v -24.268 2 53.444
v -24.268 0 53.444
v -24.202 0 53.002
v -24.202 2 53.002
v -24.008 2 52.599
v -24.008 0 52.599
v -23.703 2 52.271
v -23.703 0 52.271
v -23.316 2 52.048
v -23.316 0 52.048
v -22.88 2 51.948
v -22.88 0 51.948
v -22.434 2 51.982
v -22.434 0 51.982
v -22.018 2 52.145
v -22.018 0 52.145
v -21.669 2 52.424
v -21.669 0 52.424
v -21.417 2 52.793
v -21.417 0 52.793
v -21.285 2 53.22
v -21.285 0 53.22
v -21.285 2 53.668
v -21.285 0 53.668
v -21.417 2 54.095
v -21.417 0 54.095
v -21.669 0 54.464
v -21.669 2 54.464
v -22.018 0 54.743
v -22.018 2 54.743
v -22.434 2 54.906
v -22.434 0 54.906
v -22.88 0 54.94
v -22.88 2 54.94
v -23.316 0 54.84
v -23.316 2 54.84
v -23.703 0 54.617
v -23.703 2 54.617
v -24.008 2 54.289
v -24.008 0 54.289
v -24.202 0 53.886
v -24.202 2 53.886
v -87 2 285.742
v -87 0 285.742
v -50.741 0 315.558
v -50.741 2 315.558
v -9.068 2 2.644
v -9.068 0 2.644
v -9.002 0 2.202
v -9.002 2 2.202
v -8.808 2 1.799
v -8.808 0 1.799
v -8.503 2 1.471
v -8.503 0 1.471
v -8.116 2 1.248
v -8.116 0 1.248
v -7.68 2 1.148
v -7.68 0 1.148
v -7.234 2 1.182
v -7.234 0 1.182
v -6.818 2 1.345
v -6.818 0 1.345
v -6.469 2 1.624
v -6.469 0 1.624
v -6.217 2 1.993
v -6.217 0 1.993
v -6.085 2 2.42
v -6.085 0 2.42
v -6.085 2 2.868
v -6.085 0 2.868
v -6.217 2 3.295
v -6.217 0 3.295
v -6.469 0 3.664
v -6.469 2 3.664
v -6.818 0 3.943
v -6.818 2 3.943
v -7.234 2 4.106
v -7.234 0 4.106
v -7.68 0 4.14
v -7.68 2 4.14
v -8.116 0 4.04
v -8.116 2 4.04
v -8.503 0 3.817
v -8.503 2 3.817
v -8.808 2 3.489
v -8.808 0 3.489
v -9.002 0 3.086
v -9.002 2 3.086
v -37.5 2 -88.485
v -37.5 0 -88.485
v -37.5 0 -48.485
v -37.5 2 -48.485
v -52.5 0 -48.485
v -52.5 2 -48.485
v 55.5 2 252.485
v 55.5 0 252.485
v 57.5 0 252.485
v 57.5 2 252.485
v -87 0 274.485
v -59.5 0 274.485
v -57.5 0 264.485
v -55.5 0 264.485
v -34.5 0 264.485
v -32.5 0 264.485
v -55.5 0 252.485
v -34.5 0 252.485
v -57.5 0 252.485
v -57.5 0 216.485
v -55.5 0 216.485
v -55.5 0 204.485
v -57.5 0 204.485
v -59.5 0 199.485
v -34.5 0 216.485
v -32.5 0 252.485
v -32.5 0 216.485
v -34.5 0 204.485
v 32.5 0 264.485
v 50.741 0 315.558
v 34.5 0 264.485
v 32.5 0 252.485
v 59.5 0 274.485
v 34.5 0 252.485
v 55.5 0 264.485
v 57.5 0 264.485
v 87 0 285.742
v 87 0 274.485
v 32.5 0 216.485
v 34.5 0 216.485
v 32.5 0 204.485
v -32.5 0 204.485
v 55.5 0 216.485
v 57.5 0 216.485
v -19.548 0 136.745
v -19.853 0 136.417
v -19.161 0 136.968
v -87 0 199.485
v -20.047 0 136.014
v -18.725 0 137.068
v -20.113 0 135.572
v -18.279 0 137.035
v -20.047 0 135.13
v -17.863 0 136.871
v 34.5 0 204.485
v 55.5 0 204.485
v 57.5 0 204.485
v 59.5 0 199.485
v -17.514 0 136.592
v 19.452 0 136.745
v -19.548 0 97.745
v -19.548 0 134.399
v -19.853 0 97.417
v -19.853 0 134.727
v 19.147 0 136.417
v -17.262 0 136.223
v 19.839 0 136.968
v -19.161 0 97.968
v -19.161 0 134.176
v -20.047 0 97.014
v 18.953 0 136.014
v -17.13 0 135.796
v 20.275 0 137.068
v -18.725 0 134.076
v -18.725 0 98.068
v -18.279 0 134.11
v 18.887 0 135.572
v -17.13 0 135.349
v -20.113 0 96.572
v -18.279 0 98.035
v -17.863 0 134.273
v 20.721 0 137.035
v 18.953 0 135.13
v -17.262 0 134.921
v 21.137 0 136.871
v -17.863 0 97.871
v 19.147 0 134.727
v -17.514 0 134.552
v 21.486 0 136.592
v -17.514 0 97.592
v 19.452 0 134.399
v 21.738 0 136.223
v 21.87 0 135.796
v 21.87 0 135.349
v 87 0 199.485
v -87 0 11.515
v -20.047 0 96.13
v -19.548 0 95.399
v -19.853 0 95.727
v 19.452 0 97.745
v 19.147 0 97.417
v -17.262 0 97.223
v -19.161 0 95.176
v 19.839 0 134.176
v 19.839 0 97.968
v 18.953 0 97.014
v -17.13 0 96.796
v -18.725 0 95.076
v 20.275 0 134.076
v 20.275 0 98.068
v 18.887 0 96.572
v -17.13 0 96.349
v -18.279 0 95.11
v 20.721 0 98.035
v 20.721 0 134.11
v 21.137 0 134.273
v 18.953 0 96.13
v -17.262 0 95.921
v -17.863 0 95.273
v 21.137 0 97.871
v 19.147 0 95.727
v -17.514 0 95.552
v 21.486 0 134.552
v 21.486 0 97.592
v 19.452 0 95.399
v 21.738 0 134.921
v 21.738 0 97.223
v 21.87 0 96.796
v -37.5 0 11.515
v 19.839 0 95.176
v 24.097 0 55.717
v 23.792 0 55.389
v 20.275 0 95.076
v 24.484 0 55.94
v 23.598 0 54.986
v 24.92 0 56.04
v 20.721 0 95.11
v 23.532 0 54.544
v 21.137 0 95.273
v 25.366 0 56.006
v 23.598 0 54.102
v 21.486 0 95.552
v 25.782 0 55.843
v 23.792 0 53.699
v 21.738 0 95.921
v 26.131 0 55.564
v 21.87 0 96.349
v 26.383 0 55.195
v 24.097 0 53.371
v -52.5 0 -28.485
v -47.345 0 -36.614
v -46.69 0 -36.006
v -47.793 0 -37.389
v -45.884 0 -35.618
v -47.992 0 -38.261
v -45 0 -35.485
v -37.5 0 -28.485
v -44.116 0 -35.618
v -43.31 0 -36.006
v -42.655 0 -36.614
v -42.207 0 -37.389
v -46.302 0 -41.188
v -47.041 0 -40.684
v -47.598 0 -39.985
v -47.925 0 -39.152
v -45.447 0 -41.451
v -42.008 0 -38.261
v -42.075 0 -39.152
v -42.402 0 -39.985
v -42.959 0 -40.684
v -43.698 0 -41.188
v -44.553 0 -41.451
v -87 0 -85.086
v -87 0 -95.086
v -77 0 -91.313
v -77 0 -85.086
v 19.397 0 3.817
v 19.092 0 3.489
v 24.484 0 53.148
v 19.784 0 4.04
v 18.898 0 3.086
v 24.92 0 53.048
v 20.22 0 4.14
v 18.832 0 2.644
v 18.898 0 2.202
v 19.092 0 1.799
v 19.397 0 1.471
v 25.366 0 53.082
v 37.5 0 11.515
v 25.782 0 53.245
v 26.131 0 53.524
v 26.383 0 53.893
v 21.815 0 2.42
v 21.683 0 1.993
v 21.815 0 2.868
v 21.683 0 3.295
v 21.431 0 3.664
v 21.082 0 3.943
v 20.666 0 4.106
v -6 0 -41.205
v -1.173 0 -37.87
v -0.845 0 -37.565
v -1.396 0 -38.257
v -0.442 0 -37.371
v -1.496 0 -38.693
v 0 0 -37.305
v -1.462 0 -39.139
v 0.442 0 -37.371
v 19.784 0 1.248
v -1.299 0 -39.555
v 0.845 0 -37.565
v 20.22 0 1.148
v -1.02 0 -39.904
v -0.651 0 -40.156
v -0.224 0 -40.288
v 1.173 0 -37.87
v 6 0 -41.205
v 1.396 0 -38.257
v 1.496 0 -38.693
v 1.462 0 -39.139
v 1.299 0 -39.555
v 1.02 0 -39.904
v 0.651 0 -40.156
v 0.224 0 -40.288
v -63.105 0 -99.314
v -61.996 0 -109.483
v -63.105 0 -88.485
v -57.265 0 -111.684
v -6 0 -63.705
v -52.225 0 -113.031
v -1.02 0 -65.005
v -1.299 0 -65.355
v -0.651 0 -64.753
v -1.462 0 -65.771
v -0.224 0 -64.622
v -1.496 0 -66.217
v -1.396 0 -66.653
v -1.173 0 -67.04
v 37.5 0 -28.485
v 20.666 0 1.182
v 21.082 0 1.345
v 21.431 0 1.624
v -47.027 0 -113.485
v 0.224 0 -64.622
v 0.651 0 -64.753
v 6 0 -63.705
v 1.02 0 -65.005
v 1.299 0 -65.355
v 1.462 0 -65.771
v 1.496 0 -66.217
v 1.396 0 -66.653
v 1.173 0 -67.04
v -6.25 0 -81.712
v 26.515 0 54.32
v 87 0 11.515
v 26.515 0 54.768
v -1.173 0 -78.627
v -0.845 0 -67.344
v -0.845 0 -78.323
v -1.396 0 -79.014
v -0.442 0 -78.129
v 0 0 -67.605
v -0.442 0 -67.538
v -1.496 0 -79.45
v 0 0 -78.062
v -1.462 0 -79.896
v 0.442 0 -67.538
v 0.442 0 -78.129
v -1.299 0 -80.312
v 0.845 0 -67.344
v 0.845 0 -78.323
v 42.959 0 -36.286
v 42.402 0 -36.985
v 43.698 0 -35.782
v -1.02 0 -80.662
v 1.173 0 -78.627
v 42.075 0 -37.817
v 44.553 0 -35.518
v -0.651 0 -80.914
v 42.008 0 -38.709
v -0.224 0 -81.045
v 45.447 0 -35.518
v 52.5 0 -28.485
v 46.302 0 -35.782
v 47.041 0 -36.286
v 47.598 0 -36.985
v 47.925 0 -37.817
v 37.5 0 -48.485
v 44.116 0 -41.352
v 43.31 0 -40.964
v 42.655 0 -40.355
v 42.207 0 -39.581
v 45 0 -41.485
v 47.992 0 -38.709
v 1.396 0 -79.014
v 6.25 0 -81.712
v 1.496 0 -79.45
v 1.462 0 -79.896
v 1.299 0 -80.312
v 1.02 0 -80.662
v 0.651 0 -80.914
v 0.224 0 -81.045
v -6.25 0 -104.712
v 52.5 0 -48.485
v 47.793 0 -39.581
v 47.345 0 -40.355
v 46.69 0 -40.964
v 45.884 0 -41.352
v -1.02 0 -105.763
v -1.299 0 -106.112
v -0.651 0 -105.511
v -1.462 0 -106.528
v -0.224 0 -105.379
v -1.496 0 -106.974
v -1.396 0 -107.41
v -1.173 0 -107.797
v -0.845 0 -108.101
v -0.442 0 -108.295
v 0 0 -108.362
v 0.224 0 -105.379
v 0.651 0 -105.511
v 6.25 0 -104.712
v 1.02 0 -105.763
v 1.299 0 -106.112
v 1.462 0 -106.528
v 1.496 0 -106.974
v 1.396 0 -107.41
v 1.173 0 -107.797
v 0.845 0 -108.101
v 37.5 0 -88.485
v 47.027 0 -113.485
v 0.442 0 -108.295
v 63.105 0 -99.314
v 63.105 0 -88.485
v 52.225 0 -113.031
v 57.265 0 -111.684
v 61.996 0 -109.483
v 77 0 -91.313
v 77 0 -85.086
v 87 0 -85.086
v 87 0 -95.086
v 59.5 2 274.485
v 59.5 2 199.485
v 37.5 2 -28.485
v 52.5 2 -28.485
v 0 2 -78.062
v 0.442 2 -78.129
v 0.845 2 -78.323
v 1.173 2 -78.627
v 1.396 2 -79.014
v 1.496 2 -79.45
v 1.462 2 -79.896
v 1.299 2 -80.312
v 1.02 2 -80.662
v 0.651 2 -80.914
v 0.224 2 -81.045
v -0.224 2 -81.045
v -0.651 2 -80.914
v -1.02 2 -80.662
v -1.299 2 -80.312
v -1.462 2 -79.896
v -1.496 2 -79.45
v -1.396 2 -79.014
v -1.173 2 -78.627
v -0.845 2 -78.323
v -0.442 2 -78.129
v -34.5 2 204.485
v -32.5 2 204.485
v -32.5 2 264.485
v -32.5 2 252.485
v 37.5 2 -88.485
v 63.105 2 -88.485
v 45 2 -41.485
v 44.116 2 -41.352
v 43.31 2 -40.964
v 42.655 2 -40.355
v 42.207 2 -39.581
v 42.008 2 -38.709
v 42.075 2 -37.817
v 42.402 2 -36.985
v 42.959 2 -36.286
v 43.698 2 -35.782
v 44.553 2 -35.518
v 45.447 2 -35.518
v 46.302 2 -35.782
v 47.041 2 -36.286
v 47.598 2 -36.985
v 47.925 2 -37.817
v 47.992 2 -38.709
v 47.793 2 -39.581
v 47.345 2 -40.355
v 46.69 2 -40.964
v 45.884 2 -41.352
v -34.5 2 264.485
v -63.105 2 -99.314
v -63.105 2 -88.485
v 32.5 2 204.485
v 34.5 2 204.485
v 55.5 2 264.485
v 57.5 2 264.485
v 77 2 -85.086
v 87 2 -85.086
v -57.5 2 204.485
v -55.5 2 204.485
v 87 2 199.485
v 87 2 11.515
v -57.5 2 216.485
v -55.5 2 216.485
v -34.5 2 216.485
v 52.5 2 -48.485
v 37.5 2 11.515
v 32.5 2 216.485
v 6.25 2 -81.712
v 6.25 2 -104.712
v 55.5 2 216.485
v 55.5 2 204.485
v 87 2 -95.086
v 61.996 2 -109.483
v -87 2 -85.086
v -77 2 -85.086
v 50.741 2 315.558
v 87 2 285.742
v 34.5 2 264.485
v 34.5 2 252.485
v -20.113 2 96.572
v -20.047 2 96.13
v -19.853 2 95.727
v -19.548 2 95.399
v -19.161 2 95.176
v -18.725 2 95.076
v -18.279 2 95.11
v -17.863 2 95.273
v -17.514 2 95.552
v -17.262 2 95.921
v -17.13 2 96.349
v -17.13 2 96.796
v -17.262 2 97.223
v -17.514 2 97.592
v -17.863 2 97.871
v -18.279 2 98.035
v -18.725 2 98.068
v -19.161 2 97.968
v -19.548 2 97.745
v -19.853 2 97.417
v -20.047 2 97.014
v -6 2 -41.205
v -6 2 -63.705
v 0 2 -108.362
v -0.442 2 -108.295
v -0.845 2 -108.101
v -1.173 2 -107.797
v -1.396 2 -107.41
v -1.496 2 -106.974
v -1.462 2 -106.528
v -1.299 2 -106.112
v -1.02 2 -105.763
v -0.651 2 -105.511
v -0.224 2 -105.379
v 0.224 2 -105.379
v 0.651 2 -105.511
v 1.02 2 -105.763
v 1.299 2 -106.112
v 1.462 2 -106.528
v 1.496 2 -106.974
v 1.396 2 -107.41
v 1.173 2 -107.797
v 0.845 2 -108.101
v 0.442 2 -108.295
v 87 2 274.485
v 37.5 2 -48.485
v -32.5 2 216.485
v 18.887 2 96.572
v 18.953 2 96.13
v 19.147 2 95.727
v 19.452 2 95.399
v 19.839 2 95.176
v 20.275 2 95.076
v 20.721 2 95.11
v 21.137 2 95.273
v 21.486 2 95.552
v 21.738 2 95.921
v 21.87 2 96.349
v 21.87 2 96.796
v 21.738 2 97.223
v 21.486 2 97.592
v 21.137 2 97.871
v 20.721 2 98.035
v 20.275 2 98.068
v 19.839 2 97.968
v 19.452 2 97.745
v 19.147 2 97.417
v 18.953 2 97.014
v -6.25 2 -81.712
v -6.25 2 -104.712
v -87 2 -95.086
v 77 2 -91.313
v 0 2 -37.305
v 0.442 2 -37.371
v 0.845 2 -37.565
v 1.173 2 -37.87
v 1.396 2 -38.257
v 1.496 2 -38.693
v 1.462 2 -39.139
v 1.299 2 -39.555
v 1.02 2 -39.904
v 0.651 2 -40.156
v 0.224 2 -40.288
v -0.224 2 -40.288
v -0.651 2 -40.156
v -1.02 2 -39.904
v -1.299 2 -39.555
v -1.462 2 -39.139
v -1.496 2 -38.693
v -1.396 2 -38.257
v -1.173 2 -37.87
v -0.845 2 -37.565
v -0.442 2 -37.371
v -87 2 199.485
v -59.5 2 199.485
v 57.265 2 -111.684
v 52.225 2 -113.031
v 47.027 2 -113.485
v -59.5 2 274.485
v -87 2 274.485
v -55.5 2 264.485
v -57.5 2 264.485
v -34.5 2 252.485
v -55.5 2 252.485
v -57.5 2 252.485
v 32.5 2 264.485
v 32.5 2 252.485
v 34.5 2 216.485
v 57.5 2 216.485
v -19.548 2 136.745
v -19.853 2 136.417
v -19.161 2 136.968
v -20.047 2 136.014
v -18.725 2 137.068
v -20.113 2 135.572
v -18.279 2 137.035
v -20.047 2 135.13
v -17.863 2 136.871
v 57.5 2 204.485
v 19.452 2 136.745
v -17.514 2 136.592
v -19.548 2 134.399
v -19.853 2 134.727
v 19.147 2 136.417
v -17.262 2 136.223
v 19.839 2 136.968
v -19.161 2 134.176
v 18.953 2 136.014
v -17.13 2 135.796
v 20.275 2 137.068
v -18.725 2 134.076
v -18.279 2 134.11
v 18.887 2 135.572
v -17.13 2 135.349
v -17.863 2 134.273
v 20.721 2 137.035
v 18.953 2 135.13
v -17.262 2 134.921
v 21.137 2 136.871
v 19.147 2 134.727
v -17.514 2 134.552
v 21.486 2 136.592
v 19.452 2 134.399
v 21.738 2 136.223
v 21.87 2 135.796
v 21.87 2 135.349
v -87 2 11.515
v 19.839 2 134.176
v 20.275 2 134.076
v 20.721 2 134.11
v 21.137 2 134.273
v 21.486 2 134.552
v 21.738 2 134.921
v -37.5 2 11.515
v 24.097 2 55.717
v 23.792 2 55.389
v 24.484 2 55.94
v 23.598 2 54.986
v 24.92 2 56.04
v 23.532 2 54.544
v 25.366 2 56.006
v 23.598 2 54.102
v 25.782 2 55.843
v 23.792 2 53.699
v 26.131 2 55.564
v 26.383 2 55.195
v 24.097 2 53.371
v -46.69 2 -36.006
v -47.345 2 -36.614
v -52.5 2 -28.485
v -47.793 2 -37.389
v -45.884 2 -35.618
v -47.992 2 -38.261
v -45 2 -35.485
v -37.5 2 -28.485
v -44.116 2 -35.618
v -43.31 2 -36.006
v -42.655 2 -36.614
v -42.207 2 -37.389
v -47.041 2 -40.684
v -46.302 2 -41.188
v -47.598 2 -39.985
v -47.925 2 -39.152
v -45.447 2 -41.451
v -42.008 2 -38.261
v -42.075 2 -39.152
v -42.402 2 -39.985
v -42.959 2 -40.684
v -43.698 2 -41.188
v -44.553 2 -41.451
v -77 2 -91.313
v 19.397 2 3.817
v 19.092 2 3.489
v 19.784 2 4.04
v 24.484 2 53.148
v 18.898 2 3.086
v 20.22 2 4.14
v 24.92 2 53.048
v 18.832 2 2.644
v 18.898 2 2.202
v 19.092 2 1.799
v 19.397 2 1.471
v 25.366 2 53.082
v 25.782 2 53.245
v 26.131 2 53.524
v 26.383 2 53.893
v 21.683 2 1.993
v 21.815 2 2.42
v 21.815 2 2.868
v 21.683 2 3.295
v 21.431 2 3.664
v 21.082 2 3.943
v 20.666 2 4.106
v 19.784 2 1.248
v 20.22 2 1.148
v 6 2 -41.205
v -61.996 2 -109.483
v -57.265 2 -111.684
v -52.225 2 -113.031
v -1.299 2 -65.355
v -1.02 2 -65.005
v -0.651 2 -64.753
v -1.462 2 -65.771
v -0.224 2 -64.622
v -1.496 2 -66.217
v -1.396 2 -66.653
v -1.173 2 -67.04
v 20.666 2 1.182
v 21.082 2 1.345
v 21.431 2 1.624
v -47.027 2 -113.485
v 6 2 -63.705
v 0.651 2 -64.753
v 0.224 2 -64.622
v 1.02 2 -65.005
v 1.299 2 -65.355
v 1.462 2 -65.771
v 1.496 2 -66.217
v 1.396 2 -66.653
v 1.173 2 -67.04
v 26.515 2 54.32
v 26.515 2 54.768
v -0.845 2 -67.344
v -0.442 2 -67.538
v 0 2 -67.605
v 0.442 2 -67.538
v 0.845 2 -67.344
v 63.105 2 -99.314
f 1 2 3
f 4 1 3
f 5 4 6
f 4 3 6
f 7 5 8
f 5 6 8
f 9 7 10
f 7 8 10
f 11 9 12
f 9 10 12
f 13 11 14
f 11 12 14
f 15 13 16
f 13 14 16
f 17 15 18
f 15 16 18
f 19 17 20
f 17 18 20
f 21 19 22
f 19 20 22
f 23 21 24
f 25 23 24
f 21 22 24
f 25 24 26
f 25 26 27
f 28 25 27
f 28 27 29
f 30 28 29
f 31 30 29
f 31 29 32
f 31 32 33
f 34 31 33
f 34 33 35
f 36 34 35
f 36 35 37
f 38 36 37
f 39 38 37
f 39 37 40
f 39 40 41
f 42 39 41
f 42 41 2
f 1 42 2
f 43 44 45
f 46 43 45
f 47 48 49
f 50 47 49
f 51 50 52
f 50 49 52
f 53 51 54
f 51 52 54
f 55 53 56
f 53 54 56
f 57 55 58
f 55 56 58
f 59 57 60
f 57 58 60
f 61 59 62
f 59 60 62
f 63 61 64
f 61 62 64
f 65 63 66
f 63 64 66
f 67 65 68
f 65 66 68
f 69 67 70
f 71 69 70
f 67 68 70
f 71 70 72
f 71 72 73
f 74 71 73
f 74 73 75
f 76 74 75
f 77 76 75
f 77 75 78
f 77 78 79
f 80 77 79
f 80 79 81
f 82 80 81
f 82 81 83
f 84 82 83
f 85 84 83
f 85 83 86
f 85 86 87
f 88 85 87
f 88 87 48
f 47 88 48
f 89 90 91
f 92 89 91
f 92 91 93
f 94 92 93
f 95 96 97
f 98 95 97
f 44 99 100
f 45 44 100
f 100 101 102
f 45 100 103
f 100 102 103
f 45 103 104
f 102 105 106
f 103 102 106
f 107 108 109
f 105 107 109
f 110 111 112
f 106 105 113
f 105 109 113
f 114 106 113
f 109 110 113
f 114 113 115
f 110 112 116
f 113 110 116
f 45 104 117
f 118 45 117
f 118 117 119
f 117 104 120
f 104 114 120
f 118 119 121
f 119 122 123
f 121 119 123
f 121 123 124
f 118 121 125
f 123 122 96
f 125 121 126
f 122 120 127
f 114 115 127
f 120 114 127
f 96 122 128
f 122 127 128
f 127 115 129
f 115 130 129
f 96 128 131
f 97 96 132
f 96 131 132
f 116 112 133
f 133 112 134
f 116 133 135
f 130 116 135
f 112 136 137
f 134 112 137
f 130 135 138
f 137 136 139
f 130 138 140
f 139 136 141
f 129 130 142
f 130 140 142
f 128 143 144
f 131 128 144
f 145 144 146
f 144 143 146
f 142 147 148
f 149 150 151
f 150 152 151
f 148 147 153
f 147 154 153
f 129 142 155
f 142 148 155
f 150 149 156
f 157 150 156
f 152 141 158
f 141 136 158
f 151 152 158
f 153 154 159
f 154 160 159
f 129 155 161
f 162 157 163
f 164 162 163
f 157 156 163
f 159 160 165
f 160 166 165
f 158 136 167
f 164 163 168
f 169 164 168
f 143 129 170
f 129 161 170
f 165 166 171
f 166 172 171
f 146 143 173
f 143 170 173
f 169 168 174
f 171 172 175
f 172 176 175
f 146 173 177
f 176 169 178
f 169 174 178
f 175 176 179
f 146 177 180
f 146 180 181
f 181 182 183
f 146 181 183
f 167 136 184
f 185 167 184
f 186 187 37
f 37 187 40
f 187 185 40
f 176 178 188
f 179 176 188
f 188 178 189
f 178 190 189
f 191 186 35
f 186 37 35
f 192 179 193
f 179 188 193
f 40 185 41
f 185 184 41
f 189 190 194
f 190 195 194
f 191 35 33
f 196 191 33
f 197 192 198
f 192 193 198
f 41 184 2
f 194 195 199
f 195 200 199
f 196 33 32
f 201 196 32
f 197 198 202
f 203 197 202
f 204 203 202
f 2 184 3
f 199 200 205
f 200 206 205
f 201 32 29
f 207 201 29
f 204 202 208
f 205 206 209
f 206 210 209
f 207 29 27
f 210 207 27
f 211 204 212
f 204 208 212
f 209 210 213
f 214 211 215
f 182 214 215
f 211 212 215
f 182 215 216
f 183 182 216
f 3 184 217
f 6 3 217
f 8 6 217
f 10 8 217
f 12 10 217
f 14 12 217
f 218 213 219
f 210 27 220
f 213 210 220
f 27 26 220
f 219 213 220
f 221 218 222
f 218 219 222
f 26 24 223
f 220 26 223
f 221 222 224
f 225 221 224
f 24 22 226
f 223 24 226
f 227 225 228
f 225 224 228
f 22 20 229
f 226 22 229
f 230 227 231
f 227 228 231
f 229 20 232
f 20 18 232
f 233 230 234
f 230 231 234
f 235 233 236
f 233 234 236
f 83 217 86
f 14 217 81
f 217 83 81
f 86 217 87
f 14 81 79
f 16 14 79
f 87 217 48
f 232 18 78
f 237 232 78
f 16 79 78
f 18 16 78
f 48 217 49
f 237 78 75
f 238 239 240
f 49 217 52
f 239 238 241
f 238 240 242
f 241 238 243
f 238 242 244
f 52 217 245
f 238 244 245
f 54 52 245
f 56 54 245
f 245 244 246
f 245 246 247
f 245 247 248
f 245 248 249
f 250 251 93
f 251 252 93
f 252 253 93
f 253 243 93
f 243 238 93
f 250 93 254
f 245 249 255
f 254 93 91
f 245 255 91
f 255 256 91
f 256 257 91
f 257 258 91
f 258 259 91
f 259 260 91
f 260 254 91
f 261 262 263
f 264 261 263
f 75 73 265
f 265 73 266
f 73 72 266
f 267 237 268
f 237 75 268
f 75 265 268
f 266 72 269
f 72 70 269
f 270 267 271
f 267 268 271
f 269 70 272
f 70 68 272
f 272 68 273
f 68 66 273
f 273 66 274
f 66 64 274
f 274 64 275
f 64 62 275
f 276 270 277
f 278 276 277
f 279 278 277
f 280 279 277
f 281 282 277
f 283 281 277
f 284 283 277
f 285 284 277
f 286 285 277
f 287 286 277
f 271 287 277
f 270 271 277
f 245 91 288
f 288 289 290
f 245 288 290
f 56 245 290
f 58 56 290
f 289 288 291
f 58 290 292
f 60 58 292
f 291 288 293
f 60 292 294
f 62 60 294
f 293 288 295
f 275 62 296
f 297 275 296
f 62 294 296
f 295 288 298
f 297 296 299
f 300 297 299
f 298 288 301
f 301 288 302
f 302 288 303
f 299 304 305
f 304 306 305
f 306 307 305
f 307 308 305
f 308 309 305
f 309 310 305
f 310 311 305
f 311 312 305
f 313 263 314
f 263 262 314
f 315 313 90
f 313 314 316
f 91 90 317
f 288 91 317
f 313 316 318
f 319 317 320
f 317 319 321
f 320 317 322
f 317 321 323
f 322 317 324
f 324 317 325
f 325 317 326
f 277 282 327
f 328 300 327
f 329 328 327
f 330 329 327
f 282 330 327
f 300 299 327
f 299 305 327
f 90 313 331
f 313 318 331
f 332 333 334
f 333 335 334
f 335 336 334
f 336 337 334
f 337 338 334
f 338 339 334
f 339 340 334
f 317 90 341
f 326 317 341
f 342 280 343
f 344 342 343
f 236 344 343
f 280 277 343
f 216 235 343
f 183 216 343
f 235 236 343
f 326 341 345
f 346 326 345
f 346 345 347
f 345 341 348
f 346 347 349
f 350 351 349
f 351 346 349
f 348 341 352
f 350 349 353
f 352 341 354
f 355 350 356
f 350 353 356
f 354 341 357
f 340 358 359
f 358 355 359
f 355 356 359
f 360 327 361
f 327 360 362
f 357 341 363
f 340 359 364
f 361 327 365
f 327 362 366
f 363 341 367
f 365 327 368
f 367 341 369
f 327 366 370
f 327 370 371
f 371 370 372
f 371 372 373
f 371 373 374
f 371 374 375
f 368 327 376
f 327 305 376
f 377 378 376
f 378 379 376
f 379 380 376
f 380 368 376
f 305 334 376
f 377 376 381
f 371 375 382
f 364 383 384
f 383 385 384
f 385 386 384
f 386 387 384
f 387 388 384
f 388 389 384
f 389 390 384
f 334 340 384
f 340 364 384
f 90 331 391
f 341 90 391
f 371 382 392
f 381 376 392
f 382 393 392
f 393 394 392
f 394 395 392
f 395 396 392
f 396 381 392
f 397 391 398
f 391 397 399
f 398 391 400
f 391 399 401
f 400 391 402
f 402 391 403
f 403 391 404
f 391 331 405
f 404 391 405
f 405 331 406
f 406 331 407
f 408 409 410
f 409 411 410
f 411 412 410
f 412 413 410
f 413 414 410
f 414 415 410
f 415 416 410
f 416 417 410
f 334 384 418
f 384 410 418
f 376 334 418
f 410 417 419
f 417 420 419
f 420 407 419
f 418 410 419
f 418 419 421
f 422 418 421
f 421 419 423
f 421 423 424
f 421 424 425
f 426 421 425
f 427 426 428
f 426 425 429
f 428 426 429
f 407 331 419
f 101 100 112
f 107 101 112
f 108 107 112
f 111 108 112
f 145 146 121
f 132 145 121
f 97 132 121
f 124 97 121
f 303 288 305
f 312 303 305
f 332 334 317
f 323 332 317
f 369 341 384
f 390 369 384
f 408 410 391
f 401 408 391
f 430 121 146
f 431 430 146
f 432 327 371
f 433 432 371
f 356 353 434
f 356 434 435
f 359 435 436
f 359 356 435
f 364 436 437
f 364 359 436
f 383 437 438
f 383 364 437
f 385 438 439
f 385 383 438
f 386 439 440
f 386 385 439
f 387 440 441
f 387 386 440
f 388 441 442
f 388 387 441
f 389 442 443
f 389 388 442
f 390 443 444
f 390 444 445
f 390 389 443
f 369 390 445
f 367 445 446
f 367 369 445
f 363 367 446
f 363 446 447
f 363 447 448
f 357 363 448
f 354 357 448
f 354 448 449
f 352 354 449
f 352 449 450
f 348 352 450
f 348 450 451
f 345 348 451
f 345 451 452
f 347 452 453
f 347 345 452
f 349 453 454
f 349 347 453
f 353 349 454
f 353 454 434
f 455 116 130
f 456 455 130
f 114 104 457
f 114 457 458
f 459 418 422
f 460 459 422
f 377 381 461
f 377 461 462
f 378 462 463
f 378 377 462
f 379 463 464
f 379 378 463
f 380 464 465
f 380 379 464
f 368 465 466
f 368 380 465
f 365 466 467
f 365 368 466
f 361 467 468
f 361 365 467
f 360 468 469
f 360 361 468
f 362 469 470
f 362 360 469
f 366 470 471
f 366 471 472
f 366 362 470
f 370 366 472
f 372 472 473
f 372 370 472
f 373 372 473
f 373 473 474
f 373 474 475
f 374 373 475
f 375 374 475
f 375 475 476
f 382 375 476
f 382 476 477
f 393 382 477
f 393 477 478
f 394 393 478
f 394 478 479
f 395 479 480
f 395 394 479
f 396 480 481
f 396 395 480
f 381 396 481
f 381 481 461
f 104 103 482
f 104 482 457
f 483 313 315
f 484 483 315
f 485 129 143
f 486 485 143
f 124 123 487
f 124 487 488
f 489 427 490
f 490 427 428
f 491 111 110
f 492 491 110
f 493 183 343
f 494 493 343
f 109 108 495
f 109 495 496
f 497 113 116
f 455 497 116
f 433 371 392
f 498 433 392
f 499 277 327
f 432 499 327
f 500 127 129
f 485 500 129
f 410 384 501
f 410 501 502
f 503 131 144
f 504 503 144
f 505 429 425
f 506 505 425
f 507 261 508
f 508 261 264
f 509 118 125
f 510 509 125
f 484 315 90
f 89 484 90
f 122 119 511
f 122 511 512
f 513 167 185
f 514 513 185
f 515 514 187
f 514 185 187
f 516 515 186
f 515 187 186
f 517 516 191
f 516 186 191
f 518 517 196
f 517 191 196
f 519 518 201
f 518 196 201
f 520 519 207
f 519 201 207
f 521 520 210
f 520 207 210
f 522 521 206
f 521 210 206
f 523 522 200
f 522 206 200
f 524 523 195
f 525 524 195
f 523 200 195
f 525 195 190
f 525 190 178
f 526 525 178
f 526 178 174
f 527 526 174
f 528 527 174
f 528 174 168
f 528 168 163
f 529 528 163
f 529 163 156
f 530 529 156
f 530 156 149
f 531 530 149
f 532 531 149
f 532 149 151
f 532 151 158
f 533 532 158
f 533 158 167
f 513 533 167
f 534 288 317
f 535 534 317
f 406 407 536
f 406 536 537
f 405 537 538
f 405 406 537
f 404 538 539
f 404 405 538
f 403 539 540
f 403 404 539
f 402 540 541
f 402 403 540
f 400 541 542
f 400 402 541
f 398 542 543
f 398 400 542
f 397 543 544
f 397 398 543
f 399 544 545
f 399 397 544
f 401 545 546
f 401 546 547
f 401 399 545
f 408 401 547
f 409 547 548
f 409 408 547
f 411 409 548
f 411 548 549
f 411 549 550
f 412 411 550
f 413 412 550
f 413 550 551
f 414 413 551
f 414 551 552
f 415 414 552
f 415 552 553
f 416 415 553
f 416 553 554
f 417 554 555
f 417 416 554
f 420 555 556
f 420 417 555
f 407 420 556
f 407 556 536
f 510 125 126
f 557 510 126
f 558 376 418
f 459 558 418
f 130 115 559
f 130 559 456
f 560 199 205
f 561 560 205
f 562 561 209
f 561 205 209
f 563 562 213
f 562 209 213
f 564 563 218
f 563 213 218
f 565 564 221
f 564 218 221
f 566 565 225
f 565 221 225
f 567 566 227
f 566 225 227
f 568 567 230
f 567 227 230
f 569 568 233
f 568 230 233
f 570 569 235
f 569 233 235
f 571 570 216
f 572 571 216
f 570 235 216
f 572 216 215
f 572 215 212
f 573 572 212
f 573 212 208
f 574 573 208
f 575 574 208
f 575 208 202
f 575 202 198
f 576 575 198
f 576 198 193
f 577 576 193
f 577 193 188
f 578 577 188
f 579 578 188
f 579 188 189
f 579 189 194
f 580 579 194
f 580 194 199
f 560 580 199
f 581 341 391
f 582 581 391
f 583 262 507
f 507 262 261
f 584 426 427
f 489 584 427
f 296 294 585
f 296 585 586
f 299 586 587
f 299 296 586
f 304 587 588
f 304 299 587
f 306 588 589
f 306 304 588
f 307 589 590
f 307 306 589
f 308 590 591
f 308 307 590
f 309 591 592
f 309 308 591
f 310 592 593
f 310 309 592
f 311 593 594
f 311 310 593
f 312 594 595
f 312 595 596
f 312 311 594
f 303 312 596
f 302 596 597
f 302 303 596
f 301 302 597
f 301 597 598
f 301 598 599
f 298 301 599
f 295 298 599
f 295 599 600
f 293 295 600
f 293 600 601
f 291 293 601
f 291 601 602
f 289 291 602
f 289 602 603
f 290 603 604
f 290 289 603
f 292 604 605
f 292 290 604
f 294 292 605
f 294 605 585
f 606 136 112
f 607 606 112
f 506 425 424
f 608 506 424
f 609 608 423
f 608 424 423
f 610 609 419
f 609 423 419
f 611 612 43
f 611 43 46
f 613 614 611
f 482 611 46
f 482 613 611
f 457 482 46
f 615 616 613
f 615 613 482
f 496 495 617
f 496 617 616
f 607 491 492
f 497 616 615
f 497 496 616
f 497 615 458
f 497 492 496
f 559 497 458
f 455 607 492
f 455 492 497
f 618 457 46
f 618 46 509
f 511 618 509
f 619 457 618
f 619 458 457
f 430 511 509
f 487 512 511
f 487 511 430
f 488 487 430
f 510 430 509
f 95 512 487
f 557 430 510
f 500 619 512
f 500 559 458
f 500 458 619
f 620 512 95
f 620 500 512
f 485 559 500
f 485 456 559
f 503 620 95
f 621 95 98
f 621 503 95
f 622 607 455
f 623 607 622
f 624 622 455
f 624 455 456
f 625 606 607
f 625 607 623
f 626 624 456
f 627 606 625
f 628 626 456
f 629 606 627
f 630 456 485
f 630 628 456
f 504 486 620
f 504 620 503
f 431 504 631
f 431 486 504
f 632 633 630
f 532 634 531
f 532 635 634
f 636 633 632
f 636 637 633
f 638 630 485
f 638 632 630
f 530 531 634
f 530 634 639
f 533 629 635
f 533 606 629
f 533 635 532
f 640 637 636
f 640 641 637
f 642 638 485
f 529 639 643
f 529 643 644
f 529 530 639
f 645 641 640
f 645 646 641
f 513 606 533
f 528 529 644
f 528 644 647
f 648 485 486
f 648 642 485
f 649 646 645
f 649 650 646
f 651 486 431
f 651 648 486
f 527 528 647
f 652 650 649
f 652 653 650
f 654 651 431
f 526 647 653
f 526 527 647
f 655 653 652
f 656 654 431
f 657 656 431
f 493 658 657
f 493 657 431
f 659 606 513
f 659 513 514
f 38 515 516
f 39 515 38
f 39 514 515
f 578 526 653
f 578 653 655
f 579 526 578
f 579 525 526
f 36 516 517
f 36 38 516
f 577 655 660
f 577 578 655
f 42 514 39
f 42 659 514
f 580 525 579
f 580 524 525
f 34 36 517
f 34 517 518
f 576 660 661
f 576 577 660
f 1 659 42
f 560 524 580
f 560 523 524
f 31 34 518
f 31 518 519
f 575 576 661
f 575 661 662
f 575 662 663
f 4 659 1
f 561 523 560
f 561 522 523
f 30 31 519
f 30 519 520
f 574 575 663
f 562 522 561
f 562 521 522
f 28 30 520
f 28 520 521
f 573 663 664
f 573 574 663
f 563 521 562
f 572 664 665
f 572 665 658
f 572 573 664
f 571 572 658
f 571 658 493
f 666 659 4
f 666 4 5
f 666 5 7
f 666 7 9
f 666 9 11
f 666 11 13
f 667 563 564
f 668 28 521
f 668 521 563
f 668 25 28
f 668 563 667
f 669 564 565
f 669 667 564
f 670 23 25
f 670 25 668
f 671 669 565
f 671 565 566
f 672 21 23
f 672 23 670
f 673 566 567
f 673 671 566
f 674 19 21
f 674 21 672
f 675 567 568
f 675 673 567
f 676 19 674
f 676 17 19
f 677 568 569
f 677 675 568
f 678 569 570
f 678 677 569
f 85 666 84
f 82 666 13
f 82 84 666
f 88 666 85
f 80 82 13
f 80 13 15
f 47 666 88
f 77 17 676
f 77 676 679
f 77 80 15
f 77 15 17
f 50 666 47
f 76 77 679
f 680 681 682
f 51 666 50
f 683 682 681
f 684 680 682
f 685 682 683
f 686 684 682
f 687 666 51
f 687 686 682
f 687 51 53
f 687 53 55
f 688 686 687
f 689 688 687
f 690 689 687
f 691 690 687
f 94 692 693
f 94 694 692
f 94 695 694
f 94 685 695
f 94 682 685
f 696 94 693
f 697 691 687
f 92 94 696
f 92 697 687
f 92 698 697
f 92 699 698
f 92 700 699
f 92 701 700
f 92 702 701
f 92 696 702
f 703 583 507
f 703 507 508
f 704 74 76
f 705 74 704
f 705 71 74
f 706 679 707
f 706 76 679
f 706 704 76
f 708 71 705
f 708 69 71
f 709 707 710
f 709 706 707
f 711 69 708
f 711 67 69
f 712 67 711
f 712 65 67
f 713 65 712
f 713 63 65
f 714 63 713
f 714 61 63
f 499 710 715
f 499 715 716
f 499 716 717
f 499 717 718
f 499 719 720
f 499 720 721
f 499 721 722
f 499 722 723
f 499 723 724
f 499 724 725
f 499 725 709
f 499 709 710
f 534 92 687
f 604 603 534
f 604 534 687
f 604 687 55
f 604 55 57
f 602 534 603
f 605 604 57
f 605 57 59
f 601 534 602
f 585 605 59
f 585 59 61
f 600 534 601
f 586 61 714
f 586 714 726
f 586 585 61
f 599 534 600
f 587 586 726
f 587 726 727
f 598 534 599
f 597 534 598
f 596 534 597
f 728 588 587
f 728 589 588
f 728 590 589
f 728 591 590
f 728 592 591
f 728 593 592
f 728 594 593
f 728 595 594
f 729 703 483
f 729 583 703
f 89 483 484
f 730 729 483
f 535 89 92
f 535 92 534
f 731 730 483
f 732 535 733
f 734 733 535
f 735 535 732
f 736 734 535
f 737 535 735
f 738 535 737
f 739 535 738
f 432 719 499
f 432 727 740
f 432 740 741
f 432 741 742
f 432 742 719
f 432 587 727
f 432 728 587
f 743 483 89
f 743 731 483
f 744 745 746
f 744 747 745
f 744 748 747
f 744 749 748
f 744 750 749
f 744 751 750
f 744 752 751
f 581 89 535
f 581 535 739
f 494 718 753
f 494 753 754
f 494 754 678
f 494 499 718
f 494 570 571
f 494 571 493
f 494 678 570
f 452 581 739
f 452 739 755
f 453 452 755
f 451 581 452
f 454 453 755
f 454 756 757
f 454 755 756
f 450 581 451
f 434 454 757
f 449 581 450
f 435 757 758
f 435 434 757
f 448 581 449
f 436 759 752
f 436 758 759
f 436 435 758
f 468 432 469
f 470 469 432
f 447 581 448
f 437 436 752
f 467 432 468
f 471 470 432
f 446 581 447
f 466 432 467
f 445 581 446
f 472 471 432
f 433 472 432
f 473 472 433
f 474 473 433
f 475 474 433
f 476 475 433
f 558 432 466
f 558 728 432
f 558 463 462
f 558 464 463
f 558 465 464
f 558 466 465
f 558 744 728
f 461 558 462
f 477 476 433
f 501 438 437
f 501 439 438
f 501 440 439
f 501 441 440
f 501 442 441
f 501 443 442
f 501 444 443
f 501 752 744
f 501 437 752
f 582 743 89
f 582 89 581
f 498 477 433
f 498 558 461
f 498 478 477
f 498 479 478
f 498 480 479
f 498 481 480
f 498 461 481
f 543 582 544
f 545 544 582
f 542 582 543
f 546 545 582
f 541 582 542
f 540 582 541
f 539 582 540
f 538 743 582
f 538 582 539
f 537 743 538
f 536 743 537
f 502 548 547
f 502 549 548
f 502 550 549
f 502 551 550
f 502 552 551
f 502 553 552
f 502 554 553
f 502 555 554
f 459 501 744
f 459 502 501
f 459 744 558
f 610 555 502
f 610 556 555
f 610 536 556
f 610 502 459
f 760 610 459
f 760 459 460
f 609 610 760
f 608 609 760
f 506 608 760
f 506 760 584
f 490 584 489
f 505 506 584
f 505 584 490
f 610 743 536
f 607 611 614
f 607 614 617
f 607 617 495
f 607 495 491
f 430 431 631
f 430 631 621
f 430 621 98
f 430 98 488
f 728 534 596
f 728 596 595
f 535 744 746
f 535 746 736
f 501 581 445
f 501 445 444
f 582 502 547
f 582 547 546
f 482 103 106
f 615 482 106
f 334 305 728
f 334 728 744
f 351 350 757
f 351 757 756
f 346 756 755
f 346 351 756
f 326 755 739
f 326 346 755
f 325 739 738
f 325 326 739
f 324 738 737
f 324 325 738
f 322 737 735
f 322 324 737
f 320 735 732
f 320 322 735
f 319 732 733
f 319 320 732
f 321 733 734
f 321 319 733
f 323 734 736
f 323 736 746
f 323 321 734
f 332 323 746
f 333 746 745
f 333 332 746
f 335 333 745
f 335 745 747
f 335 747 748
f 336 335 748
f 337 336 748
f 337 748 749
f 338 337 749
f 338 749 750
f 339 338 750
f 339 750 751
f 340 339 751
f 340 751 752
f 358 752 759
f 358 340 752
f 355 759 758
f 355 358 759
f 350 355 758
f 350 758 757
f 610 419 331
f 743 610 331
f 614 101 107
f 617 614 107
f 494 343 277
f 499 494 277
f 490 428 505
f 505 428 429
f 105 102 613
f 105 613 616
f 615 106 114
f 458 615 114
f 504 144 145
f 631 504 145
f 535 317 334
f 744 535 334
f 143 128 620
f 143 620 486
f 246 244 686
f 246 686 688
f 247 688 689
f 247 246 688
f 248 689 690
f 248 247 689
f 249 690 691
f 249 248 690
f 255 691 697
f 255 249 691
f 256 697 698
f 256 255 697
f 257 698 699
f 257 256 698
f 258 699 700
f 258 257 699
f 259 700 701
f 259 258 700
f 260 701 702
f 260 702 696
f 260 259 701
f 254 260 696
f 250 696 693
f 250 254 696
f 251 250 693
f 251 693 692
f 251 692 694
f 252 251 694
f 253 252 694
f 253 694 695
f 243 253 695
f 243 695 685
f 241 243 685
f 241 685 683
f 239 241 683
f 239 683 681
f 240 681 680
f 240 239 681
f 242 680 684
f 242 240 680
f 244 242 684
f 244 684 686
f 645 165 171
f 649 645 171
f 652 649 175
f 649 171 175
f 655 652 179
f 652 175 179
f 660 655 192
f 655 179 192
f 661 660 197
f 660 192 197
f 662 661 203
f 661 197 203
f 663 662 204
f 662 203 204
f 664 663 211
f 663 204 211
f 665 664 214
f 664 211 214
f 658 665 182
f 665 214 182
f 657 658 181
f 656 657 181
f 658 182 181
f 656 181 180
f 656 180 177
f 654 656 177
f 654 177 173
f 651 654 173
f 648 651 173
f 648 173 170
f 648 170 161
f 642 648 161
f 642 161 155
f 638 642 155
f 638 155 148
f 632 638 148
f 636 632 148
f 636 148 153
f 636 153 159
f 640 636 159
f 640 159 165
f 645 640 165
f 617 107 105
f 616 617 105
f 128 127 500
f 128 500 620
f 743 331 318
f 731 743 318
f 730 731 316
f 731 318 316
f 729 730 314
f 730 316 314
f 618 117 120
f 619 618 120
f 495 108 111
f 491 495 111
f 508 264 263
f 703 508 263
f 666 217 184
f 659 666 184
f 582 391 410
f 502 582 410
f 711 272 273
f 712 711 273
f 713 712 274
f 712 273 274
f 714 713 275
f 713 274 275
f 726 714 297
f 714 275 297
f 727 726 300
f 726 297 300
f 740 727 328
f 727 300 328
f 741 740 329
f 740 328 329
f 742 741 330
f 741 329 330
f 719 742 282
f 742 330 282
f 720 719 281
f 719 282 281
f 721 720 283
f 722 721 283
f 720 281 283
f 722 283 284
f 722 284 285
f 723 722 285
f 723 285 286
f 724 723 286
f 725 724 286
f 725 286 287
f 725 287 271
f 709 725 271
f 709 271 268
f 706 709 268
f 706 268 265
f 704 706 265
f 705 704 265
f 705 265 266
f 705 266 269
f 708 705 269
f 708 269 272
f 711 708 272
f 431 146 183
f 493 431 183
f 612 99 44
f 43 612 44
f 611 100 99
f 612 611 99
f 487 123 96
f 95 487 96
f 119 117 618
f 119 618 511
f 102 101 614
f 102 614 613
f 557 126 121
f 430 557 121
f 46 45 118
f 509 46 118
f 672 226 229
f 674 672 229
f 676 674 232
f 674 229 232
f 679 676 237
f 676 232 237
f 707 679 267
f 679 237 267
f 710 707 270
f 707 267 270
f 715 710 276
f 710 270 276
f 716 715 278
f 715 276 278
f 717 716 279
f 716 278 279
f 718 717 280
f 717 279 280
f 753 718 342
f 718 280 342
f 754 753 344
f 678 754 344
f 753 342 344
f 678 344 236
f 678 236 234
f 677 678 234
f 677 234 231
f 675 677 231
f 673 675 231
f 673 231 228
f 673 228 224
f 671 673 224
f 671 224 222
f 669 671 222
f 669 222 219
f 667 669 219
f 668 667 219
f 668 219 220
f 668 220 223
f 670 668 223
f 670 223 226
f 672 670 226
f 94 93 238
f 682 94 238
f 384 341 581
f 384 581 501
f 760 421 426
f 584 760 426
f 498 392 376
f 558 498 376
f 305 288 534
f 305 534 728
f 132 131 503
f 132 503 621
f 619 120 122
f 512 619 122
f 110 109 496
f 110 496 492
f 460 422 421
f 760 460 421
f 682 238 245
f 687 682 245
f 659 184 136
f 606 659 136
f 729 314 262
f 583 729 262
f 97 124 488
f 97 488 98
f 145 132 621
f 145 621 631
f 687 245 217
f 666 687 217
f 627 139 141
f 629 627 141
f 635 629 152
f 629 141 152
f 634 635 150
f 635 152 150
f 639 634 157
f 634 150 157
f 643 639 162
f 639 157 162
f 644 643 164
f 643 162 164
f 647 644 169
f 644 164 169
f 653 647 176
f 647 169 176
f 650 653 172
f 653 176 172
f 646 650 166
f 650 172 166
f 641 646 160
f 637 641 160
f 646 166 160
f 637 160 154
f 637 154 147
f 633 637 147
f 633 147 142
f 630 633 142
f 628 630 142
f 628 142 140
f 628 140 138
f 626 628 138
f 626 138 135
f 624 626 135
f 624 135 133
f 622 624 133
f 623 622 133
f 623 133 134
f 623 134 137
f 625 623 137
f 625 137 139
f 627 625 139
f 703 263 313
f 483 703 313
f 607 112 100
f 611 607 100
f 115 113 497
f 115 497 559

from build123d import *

# Parameters (mm, degrees)
SKETCH1_R                = 3
SKETCH1_R_2              = 1.5
SKETCH1_W                = 2
SKETCH1_H                = 12
SKETCH1_W_2              = 12
SKETCH1_H_2              = 22.5
SKETCH1_W_3              = 12.5
SKETCH1_H_3              = 23
BOSS_EXTRUDE2_DEPTH      = 2
F_3_0_3_DIAMETER_HOLE1_D = 3
F_3_0_3_DIAMETER_HOLE2_D = 3


with BuildPart() as part:
    # Sketch1 → Boss-Extrude2 (new body)
    with BuildSketch(Plane(origin=(0, 0, 0), x_dir=(1, 0, 0), z_dir=(0, 1, 0))):
        with BuildLine():
            Line((47.026548113, 113.484810936), (-47.026548113, 113.484810936))
            ThreePointArc((-47.026548113, 113.484810936), (-54.774215022, 112.467109973), (-61.996228059, 109.483054768))
            Line((-61.996228059, 109.483054768), (-87, 95.085987572))
            Line((-87, 95.085987572), (-87, 85.085987572))
            Line((-87, 85.085987572), (-77, 85.085987572))
            Line((-77, 85.085987572), (-77, 91.313276712))
            Line((-77, 91.313276712), (-63.105457223, 99.313696268))
            Line((-63.105457223, 99.313696268), (-63.105457223, 88.484810936))
            Line((-63.105457223, 88.484810936), (-37.5, 88.484810936))
            Line((-37.5, 88.484810936), (-37.5, 48.484810936))
            Line((-37.5, 48.484810936), (-52.5, 48.484810936))
            Line((-52.5, 48.484810936), (-52.5, 28.484810936))
            Line((-52.5, 28.484810936), (-37.5, 28.484810936))
            Line((-37.5, 28.484810936), (-37.5, -11.515189064))
            Line((-37.5, -11.515189064), (-87, -11.515189064))
            Line((-87, -11.515189064), (-87, -199.484504535))
            Line((-87, -199.484504535), (-59.5, -199.484504535))
            Line((-59.5, -199.484504535), (-59.5, -274.484504535))
            Line((-59.5, -274.484504535), (-87, -274.484504535))
            Line((-87, -274.484504535), (-87, -275.742175661))
            Line((-87, -275.742175661), (-87, -285.742175661))
            Line((-87, -285.742175661), (-50.740945714, -315.558389864))
            Line((-50.740945714, -315.558389864), (50.740945714, -315.558389864))
            Line((50.740945714, -315.558389864), (87, -285.742175661))
            Line((87, -285.742175661), (87, -275.742175661))
            Line((87, -275.742175661), (87, -274.484504535))
            Line((87, -274.484504535), (59.5, -274.484504535))
            Line((59.5, -274.484504535), (59.5, -199.484504535))
            Line((59.5, -199.484504535), (87, -199.484504535))
            Line((87, -199.484504535), (87, -11.515189064))
            Line((87, -11.515189064), (37.5, -11.515189064))
            Line((37.5, -11.515189064), (37.5, 28.484810936))
            Line((37.5, 28.484810936), (52.5, 28.484810936))
            Line((52.5, 28.484810936), (52.5, 48.484810936))
            Line((52.5, 48.484810936), (37.5, 48.484810936))
            Line((37.5, 48.484810936), (37.5, 88.484810936))
            Line((37.5, 88.484810936), (63.105457223, 88.484810936))
            Line((63.105457223, 88.484810936), (63.105457223, 99.313696268))
            Line((63.105457223, 99.313696268), (77, 91.313276712))
            Line((77, 91.313276712), (77, 85.085987572))
            Line((77, 85.085987572), (87, 85.085987572))
            Line((87, 85.085987572), (87, 95.085987572))
            Line((87, 95.085987572), (61.996228059, 109.483054768))
            ThreePointArc((61.996228059, 109.483054768), (54.774215022, 112.467109973), (47.026548113, 113.484810936))
        make_face()
        with Locations(Location((-45, 38.484810936, 0), (0, 0, 270))):
            Circle(SKETCH1_R, mode=Mode.SUBTRACT)
        with Locations(Location((45, 38.484810936, 0), (0, 0, 90))):
            Circle(SKETCH1_R, mode=Mode.SUBTRACT)
        with Locations(Location((0, 38.804810936, 0), (0, 0, 270))):
            Circle(SKETCH1_R_2, mode=Mode.SUBTRACT)
        with Locations(Location((0, 66.104810936, 0), (0, 0, 90))):
            Circle(SKETCH1_R_2, mode=Mode.SUBTRACT)
        with Locations(Location((0, 79.56209058, 0), (0, 0, 270))):
            Circle(SKETCH1_R_2, mode=Mode.SUBTRACT)
        with Locations(Location((0, 106.86209058, 0), (0, 0, 90))):
            Circle(SKETCH1_R_2, mode=Mode.SUBTRACT)
        with Locations((-33.5, -258.484504535)):
            Rectangle(SKETCH1_W, SKETCH1_H, mode=Mode.SUBTRACT)
        with Locations((-56.5, -258.484504535)):
            Rectangle(SKETCH1_W, SKETCH1_H, mode=Mode.SUBTRACT)
        with Locations((-33.5, -210.484504535)):
            Rectangle(SKETCH1_W, SKETCH1_H, mode=Mode.SUBTRACT)
        with Locations((-56.5, -210.484504535)):
            Rectangle(SKETCH1_W, SKETCH1_H, mode=Mode.SUBTRACT)
        with Locations((56.5, -210.484504535)):
            Rectangle(SKETCH1_W, SKETCH1_H, mode=Mode.SUBTRACT)
        with Locations((33.5, -210.484504535)):
            Rectangle(SKETCH1_W, SKETCH1_H, mode=Mode.SUBTRACT)
        with Locations((56.5, -258.484504535)):
            Rectangle(SKETCH1_W, SKETCH1_H, mode=Mode.SUBTRACT)
        with Locations((33.5, -258.484504535)):
            Rectangle(SKETCH1_W, SKETCH1_H, mode=Mode.SUBTRACT)
        with Locations((0, 52.454810936)):
            Rectangle(SKETCH1_W_2, SKETCH1_H_2, mode=Mode.SUBTRACT)
        with Locations((0, 93.21209058)):
            Rectangle(SKETCH1_W_3, SKETCH1_H_3, mode=Mode.SUBTRACT)
    extrude(amount=BOSS_EXTRUDE2_DEPTH)

    # Ø3.0 (3) Diameter Hole1 (through all)
    with Locations(Plane(origin=(-77.532035134, 2, -197.100991793), x_dir=(1, 0, 0), z_dir=(0, 1, 0))):
        with Locations((97.86378973, -199.745008939), (69.96378973, -199.745008939), (54.76378973, -250.545008939), (102.56378973, -251.645008939)):
            Hole(F_3_0_3_DIAMETER_HOLE1_D / 2)

    # Ø3.0 (3) Diameter Hole2 (through all)
    with Locations(Plane(origin=(-77.532035134, 4, -197.100991793), x_dir=(1, 0, 0), z_dir=(0, 1, 0))):
        with Locations((97.918849389, -293.673103718), (58.918849389, -293.673103718), (58.918849389, -332.673103718), (97.918849389, -332.673103718)):
            Hole(F_3_0_3_DIAMETER_HOLE2_D / 2)


solid = part.part
